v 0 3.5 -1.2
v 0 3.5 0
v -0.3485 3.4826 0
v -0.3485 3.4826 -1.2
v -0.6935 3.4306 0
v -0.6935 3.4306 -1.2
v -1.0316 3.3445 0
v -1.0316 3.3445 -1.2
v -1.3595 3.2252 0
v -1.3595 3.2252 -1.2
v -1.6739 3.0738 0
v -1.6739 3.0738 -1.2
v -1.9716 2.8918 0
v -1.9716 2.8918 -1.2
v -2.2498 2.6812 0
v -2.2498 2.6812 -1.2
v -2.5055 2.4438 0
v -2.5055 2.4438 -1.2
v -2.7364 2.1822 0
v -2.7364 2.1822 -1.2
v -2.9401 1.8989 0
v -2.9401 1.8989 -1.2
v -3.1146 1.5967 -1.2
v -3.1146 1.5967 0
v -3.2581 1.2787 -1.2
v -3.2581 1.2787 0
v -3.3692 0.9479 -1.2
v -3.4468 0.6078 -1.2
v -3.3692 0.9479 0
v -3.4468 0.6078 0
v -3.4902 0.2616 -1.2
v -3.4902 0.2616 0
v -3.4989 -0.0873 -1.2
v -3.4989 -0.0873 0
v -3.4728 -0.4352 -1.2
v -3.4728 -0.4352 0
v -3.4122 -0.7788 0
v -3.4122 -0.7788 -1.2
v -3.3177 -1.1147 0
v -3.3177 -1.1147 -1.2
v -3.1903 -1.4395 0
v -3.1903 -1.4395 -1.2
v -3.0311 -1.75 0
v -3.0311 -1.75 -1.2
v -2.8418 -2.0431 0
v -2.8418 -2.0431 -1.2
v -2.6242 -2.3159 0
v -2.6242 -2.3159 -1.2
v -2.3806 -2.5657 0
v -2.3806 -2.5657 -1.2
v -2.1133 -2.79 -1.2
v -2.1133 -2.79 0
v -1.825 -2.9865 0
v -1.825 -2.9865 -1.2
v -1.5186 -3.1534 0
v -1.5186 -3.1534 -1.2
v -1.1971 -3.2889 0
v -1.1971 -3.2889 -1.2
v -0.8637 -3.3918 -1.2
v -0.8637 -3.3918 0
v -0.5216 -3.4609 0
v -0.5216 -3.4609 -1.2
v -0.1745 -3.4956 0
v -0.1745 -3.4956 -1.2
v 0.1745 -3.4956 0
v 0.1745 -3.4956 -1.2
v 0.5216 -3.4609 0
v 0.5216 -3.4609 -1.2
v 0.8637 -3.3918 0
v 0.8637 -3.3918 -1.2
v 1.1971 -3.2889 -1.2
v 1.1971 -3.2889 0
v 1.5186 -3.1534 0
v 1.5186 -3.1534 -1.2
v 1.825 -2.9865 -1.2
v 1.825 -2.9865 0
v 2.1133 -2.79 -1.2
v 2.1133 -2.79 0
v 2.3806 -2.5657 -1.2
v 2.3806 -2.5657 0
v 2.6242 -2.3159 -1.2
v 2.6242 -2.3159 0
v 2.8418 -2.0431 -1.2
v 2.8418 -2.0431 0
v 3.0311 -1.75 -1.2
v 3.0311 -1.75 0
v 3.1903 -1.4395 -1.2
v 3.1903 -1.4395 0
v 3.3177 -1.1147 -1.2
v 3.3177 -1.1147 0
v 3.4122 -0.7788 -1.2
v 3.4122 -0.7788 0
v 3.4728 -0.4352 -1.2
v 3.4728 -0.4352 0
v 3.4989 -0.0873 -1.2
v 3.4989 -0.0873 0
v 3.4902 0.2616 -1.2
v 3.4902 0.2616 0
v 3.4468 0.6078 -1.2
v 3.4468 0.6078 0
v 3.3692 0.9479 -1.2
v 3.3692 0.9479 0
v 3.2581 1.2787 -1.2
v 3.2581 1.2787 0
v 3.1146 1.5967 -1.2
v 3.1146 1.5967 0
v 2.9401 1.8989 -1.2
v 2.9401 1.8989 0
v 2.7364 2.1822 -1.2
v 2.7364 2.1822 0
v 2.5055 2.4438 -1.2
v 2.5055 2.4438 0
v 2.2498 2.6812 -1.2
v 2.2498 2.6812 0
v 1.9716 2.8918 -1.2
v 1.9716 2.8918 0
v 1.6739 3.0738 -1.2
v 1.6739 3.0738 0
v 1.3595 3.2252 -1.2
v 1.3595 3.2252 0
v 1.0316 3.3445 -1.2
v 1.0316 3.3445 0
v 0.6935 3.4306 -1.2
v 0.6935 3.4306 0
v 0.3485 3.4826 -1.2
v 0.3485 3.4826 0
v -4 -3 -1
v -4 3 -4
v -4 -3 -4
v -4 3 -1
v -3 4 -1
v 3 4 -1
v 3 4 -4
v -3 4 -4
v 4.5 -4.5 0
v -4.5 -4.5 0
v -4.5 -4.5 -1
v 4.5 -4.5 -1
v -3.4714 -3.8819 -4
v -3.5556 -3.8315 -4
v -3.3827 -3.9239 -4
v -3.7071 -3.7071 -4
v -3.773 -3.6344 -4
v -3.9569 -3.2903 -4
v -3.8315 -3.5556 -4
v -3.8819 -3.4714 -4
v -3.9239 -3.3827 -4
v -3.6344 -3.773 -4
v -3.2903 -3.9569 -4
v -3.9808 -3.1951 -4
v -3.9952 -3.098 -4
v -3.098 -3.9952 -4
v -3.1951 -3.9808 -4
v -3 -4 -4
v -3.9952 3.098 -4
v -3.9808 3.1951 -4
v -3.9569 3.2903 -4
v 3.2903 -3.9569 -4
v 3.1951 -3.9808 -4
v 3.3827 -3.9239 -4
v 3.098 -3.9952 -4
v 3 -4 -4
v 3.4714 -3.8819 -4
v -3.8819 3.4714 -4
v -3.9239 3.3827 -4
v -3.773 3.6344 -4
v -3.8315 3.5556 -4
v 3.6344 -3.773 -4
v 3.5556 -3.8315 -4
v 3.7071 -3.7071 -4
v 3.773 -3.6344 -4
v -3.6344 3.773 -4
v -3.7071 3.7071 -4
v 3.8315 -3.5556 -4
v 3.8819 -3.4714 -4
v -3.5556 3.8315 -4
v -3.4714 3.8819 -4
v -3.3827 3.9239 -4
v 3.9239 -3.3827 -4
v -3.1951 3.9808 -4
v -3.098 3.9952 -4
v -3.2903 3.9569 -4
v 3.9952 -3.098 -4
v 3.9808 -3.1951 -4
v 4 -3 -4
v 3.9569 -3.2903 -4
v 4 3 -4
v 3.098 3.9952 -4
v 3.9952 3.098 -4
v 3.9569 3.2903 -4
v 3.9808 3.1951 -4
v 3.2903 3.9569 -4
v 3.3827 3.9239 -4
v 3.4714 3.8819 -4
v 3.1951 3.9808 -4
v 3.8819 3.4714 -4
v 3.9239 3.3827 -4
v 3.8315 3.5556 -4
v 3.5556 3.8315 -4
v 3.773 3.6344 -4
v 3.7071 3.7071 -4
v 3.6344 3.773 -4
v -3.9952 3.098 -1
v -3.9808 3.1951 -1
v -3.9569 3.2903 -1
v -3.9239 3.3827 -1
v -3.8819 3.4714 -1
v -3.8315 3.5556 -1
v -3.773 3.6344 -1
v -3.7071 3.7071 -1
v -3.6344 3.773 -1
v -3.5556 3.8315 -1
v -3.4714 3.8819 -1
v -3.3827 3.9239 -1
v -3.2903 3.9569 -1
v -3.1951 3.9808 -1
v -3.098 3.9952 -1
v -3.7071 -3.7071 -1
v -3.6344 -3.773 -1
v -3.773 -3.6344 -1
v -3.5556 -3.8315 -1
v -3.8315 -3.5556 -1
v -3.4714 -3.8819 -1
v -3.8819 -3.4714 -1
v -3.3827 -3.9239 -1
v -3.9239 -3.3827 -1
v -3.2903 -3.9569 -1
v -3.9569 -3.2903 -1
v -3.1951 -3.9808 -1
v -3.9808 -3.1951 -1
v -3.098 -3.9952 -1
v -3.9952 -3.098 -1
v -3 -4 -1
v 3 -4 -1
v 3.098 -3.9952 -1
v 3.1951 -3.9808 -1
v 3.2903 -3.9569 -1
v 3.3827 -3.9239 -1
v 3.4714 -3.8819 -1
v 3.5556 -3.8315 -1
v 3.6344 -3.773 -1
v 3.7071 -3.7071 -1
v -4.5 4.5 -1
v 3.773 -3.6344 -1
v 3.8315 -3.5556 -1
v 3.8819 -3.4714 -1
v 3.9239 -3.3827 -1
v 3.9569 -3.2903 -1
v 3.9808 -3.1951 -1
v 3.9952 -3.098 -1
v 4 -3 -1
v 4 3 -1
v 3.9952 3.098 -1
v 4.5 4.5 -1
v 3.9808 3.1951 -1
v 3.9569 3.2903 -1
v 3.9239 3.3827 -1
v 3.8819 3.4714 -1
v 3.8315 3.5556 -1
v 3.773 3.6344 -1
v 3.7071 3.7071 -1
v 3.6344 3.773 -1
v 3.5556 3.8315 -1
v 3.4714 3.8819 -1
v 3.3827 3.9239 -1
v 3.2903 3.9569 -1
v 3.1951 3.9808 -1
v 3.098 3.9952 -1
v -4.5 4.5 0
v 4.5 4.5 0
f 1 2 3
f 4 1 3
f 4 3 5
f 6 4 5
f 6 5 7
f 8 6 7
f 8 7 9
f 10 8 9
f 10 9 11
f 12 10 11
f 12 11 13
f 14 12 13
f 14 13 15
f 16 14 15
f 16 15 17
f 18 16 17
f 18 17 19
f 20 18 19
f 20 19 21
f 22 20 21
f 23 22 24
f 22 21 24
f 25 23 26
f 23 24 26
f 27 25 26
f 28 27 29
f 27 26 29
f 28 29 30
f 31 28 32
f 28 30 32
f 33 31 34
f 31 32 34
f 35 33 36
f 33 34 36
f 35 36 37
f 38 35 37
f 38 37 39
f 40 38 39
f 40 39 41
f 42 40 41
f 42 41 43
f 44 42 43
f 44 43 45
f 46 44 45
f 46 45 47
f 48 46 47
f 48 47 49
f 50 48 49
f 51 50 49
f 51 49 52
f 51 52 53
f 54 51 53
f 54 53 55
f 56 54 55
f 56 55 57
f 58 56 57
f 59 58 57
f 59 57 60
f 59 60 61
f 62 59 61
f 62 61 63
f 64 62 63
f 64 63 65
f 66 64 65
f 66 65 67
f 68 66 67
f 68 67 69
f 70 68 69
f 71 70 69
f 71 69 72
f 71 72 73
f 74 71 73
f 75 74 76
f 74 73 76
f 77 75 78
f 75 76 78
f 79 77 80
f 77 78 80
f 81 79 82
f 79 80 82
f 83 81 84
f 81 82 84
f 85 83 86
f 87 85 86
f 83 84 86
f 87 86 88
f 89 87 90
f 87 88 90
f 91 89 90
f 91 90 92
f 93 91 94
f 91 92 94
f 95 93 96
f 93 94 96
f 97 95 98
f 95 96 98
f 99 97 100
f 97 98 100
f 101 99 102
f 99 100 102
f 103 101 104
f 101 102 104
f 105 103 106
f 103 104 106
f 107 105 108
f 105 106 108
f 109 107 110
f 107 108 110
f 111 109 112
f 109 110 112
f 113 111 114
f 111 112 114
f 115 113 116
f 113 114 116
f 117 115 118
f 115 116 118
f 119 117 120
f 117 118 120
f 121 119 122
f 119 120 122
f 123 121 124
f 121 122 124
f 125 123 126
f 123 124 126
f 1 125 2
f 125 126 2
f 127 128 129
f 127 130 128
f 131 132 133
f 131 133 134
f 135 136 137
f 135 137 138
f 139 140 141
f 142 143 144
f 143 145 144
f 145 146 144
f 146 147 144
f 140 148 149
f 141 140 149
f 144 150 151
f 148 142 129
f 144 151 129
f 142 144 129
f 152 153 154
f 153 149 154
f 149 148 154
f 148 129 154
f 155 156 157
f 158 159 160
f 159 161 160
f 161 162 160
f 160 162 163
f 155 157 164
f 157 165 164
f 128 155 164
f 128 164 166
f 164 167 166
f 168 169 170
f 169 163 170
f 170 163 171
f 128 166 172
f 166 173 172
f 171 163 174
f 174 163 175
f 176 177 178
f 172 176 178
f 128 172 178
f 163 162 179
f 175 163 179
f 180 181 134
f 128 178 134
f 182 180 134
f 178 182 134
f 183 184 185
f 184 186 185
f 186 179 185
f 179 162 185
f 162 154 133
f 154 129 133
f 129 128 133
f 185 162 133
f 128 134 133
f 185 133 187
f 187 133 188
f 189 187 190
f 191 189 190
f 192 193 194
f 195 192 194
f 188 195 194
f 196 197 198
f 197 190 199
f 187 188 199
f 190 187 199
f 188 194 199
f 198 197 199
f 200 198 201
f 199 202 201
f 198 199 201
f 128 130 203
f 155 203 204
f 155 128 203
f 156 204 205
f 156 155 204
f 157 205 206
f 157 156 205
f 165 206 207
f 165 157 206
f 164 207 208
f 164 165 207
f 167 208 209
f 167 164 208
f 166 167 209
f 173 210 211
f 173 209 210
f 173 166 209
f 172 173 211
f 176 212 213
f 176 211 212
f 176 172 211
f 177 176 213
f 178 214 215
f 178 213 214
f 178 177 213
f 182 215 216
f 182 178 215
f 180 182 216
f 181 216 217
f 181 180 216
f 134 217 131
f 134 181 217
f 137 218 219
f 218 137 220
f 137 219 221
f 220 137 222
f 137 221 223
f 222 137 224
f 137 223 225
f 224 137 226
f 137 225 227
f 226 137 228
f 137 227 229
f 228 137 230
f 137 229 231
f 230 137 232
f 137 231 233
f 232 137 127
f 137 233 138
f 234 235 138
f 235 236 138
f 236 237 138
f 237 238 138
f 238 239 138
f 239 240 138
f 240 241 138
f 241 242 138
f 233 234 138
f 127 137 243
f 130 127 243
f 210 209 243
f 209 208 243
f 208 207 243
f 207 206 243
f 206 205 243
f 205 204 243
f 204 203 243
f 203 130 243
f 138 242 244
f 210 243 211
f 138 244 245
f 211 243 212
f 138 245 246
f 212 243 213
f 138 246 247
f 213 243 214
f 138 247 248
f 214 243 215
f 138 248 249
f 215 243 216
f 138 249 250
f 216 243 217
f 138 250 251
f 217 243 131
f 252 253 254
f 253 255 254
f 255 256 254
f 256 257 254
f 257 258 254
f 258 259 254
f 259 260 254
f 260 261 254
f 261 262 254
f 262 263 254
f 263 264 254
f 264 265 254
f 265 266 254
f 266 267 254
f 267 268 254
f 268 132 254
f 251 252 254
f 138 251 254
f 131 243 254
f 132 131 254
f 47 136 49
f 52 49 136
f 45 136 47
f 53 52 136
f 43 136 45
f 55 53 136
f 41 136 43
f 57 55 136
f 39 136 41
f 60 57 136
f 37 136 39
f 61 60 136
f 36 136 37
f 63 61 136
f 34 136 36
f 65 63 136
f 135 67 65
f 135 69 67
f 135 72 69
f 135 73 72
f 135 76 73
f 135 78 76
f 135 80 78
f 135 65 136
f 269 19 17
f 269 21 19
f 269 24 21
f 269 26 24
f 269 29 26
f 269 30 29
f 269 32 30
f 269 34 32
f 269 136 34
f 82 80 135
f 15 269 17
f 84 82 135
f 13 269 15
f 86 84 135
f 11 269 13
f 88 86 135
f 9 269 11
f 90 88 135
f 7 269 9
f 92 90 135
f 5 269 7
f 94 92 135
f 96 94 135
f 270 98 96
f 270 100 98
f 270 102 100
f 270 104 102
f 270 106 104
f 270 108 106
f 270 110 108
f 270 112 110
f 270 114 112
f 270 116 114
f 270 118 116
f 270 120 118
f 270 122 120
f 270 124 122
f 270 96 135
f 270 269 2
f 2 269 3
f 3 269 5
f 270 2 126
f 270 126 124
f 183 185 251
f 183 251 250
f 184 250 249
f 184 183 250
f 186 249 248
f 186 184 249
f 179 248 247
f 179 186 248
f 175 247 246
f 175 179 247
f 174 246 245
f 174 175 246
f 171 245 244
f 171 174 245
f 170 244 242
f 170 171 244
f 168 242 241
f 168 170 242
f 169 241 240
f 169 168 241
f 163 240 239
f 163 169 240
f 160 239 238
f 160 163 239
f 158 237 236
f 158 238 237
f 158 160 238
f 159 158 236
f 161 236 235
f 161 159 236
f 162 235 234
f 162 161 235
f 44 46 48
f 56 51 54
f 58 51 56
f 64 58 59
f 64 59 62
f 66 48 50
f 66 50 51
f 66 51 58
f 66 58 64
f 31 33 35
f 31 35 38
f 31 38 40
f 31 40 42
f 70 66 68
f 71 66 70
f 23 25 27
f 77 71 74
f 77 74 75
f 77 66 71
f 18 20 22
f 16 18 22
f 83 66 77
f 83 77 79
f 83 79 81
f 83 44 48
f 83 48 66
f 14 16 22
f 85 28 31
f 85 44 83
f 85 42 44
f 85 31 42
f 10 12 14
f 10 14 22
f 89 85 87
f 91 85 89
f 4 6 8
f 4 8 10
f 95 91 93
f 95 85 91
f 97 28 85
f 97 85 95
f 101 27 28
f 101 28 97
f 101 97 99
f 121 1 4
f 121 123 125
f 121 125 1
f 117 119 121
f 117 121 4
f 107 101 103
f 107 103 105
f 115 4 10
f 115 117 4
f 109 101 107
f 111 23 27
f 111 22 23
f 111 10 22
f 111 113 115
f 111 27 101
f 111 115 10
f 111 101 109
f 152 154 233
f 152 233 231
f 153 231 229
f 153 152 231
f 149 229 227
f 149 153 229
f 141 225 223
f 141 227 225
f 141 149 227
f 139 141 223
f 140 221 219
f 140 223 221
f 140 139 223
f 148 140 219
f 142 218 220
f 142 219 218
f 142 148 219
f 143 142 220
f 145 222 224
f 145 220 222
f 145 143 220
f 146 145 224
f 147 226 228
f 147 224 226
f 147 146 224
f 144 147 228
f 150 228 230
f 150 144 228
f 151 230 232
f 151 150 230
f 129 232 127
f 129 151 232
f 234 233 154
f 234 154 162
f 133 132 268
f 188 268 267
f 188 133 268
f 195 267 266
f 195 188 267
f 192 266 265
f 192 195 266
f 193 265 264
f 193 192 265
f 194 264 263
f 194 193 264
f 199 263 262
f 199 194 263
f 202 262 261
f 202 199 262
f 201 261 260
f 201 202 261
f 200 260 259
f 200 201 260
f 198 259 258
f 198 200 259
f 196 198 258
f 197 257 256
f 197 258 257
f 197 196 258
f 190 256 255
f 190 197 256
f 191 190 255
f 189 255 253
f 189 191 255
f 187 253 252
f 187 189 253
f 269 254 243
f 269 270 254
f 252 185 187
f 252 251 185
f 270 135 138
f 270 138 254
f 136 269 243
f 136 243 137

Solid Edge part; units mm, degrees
sketch "Sketch1" plane through (0, 0, 0) normal (0, 0, 1) x (1, 0, 0)
  line L0 (4, -4) -> (4, 4)
  line L1 (4, 4) -> (-4, 4)
  line L2 (-4, 4) -> (-4, -4)
  line L3 (-4, -4) -> (4, -4)
extrude "ExtrudedProtrusion_1" add sketch "Sketch1" against normal blind 4
sketch "Sketch2" plane through (0, 0, 0) normal (0, 0, 1) x (0, 1, 0)
  circle A0 centre (0, 0) radius 3.5
extrude "ExtrudedCutout_1" cut sketch "Sketch2" against normal blind 1.2
fillet "Round_1" radius 1 4 edges at (4, -4, -2) (-4, -4, -2) (4, 4, -2) (-4, 4, -2)
sketch "Sketch3" plane through (0, 0, 0) normal (0, 0, 1) x (1, 0, 0)
  line L0 (4, -3) -> (4, 3)
  arc A0 (4, 3) -> (3, 4) centre (3, 3) ccw
  line L1 (3, 4) -> (-3, 4)
  arc A1 (-3, 4) -> (-4, 3) centre (-3, 3) ccw
  line L2 (-4, 3) -> (-4, -3)
  arc A2 (-4, -3) -> (-3, -4) centre (-3, -3) ccw
  line L3 (-3, -4) -> (3, -4)
  arc A3 (3, -4) -> (4, -3) centre (3, -3) ccw
  line L4 (4.5, -4.5) -> (4.5, 4.5)
  line L5 (4.5, 4.5) -> (-4.5, 4.5)
  line L6 (-4.5, 4.5) -> (-4.5, -4.5)
  line L7 (-4.5, -4.5) -> (4.5, -4.5)
extrude "ExtrudedProtrusion_2" add sketch "Sketch3" against normal blind 1
